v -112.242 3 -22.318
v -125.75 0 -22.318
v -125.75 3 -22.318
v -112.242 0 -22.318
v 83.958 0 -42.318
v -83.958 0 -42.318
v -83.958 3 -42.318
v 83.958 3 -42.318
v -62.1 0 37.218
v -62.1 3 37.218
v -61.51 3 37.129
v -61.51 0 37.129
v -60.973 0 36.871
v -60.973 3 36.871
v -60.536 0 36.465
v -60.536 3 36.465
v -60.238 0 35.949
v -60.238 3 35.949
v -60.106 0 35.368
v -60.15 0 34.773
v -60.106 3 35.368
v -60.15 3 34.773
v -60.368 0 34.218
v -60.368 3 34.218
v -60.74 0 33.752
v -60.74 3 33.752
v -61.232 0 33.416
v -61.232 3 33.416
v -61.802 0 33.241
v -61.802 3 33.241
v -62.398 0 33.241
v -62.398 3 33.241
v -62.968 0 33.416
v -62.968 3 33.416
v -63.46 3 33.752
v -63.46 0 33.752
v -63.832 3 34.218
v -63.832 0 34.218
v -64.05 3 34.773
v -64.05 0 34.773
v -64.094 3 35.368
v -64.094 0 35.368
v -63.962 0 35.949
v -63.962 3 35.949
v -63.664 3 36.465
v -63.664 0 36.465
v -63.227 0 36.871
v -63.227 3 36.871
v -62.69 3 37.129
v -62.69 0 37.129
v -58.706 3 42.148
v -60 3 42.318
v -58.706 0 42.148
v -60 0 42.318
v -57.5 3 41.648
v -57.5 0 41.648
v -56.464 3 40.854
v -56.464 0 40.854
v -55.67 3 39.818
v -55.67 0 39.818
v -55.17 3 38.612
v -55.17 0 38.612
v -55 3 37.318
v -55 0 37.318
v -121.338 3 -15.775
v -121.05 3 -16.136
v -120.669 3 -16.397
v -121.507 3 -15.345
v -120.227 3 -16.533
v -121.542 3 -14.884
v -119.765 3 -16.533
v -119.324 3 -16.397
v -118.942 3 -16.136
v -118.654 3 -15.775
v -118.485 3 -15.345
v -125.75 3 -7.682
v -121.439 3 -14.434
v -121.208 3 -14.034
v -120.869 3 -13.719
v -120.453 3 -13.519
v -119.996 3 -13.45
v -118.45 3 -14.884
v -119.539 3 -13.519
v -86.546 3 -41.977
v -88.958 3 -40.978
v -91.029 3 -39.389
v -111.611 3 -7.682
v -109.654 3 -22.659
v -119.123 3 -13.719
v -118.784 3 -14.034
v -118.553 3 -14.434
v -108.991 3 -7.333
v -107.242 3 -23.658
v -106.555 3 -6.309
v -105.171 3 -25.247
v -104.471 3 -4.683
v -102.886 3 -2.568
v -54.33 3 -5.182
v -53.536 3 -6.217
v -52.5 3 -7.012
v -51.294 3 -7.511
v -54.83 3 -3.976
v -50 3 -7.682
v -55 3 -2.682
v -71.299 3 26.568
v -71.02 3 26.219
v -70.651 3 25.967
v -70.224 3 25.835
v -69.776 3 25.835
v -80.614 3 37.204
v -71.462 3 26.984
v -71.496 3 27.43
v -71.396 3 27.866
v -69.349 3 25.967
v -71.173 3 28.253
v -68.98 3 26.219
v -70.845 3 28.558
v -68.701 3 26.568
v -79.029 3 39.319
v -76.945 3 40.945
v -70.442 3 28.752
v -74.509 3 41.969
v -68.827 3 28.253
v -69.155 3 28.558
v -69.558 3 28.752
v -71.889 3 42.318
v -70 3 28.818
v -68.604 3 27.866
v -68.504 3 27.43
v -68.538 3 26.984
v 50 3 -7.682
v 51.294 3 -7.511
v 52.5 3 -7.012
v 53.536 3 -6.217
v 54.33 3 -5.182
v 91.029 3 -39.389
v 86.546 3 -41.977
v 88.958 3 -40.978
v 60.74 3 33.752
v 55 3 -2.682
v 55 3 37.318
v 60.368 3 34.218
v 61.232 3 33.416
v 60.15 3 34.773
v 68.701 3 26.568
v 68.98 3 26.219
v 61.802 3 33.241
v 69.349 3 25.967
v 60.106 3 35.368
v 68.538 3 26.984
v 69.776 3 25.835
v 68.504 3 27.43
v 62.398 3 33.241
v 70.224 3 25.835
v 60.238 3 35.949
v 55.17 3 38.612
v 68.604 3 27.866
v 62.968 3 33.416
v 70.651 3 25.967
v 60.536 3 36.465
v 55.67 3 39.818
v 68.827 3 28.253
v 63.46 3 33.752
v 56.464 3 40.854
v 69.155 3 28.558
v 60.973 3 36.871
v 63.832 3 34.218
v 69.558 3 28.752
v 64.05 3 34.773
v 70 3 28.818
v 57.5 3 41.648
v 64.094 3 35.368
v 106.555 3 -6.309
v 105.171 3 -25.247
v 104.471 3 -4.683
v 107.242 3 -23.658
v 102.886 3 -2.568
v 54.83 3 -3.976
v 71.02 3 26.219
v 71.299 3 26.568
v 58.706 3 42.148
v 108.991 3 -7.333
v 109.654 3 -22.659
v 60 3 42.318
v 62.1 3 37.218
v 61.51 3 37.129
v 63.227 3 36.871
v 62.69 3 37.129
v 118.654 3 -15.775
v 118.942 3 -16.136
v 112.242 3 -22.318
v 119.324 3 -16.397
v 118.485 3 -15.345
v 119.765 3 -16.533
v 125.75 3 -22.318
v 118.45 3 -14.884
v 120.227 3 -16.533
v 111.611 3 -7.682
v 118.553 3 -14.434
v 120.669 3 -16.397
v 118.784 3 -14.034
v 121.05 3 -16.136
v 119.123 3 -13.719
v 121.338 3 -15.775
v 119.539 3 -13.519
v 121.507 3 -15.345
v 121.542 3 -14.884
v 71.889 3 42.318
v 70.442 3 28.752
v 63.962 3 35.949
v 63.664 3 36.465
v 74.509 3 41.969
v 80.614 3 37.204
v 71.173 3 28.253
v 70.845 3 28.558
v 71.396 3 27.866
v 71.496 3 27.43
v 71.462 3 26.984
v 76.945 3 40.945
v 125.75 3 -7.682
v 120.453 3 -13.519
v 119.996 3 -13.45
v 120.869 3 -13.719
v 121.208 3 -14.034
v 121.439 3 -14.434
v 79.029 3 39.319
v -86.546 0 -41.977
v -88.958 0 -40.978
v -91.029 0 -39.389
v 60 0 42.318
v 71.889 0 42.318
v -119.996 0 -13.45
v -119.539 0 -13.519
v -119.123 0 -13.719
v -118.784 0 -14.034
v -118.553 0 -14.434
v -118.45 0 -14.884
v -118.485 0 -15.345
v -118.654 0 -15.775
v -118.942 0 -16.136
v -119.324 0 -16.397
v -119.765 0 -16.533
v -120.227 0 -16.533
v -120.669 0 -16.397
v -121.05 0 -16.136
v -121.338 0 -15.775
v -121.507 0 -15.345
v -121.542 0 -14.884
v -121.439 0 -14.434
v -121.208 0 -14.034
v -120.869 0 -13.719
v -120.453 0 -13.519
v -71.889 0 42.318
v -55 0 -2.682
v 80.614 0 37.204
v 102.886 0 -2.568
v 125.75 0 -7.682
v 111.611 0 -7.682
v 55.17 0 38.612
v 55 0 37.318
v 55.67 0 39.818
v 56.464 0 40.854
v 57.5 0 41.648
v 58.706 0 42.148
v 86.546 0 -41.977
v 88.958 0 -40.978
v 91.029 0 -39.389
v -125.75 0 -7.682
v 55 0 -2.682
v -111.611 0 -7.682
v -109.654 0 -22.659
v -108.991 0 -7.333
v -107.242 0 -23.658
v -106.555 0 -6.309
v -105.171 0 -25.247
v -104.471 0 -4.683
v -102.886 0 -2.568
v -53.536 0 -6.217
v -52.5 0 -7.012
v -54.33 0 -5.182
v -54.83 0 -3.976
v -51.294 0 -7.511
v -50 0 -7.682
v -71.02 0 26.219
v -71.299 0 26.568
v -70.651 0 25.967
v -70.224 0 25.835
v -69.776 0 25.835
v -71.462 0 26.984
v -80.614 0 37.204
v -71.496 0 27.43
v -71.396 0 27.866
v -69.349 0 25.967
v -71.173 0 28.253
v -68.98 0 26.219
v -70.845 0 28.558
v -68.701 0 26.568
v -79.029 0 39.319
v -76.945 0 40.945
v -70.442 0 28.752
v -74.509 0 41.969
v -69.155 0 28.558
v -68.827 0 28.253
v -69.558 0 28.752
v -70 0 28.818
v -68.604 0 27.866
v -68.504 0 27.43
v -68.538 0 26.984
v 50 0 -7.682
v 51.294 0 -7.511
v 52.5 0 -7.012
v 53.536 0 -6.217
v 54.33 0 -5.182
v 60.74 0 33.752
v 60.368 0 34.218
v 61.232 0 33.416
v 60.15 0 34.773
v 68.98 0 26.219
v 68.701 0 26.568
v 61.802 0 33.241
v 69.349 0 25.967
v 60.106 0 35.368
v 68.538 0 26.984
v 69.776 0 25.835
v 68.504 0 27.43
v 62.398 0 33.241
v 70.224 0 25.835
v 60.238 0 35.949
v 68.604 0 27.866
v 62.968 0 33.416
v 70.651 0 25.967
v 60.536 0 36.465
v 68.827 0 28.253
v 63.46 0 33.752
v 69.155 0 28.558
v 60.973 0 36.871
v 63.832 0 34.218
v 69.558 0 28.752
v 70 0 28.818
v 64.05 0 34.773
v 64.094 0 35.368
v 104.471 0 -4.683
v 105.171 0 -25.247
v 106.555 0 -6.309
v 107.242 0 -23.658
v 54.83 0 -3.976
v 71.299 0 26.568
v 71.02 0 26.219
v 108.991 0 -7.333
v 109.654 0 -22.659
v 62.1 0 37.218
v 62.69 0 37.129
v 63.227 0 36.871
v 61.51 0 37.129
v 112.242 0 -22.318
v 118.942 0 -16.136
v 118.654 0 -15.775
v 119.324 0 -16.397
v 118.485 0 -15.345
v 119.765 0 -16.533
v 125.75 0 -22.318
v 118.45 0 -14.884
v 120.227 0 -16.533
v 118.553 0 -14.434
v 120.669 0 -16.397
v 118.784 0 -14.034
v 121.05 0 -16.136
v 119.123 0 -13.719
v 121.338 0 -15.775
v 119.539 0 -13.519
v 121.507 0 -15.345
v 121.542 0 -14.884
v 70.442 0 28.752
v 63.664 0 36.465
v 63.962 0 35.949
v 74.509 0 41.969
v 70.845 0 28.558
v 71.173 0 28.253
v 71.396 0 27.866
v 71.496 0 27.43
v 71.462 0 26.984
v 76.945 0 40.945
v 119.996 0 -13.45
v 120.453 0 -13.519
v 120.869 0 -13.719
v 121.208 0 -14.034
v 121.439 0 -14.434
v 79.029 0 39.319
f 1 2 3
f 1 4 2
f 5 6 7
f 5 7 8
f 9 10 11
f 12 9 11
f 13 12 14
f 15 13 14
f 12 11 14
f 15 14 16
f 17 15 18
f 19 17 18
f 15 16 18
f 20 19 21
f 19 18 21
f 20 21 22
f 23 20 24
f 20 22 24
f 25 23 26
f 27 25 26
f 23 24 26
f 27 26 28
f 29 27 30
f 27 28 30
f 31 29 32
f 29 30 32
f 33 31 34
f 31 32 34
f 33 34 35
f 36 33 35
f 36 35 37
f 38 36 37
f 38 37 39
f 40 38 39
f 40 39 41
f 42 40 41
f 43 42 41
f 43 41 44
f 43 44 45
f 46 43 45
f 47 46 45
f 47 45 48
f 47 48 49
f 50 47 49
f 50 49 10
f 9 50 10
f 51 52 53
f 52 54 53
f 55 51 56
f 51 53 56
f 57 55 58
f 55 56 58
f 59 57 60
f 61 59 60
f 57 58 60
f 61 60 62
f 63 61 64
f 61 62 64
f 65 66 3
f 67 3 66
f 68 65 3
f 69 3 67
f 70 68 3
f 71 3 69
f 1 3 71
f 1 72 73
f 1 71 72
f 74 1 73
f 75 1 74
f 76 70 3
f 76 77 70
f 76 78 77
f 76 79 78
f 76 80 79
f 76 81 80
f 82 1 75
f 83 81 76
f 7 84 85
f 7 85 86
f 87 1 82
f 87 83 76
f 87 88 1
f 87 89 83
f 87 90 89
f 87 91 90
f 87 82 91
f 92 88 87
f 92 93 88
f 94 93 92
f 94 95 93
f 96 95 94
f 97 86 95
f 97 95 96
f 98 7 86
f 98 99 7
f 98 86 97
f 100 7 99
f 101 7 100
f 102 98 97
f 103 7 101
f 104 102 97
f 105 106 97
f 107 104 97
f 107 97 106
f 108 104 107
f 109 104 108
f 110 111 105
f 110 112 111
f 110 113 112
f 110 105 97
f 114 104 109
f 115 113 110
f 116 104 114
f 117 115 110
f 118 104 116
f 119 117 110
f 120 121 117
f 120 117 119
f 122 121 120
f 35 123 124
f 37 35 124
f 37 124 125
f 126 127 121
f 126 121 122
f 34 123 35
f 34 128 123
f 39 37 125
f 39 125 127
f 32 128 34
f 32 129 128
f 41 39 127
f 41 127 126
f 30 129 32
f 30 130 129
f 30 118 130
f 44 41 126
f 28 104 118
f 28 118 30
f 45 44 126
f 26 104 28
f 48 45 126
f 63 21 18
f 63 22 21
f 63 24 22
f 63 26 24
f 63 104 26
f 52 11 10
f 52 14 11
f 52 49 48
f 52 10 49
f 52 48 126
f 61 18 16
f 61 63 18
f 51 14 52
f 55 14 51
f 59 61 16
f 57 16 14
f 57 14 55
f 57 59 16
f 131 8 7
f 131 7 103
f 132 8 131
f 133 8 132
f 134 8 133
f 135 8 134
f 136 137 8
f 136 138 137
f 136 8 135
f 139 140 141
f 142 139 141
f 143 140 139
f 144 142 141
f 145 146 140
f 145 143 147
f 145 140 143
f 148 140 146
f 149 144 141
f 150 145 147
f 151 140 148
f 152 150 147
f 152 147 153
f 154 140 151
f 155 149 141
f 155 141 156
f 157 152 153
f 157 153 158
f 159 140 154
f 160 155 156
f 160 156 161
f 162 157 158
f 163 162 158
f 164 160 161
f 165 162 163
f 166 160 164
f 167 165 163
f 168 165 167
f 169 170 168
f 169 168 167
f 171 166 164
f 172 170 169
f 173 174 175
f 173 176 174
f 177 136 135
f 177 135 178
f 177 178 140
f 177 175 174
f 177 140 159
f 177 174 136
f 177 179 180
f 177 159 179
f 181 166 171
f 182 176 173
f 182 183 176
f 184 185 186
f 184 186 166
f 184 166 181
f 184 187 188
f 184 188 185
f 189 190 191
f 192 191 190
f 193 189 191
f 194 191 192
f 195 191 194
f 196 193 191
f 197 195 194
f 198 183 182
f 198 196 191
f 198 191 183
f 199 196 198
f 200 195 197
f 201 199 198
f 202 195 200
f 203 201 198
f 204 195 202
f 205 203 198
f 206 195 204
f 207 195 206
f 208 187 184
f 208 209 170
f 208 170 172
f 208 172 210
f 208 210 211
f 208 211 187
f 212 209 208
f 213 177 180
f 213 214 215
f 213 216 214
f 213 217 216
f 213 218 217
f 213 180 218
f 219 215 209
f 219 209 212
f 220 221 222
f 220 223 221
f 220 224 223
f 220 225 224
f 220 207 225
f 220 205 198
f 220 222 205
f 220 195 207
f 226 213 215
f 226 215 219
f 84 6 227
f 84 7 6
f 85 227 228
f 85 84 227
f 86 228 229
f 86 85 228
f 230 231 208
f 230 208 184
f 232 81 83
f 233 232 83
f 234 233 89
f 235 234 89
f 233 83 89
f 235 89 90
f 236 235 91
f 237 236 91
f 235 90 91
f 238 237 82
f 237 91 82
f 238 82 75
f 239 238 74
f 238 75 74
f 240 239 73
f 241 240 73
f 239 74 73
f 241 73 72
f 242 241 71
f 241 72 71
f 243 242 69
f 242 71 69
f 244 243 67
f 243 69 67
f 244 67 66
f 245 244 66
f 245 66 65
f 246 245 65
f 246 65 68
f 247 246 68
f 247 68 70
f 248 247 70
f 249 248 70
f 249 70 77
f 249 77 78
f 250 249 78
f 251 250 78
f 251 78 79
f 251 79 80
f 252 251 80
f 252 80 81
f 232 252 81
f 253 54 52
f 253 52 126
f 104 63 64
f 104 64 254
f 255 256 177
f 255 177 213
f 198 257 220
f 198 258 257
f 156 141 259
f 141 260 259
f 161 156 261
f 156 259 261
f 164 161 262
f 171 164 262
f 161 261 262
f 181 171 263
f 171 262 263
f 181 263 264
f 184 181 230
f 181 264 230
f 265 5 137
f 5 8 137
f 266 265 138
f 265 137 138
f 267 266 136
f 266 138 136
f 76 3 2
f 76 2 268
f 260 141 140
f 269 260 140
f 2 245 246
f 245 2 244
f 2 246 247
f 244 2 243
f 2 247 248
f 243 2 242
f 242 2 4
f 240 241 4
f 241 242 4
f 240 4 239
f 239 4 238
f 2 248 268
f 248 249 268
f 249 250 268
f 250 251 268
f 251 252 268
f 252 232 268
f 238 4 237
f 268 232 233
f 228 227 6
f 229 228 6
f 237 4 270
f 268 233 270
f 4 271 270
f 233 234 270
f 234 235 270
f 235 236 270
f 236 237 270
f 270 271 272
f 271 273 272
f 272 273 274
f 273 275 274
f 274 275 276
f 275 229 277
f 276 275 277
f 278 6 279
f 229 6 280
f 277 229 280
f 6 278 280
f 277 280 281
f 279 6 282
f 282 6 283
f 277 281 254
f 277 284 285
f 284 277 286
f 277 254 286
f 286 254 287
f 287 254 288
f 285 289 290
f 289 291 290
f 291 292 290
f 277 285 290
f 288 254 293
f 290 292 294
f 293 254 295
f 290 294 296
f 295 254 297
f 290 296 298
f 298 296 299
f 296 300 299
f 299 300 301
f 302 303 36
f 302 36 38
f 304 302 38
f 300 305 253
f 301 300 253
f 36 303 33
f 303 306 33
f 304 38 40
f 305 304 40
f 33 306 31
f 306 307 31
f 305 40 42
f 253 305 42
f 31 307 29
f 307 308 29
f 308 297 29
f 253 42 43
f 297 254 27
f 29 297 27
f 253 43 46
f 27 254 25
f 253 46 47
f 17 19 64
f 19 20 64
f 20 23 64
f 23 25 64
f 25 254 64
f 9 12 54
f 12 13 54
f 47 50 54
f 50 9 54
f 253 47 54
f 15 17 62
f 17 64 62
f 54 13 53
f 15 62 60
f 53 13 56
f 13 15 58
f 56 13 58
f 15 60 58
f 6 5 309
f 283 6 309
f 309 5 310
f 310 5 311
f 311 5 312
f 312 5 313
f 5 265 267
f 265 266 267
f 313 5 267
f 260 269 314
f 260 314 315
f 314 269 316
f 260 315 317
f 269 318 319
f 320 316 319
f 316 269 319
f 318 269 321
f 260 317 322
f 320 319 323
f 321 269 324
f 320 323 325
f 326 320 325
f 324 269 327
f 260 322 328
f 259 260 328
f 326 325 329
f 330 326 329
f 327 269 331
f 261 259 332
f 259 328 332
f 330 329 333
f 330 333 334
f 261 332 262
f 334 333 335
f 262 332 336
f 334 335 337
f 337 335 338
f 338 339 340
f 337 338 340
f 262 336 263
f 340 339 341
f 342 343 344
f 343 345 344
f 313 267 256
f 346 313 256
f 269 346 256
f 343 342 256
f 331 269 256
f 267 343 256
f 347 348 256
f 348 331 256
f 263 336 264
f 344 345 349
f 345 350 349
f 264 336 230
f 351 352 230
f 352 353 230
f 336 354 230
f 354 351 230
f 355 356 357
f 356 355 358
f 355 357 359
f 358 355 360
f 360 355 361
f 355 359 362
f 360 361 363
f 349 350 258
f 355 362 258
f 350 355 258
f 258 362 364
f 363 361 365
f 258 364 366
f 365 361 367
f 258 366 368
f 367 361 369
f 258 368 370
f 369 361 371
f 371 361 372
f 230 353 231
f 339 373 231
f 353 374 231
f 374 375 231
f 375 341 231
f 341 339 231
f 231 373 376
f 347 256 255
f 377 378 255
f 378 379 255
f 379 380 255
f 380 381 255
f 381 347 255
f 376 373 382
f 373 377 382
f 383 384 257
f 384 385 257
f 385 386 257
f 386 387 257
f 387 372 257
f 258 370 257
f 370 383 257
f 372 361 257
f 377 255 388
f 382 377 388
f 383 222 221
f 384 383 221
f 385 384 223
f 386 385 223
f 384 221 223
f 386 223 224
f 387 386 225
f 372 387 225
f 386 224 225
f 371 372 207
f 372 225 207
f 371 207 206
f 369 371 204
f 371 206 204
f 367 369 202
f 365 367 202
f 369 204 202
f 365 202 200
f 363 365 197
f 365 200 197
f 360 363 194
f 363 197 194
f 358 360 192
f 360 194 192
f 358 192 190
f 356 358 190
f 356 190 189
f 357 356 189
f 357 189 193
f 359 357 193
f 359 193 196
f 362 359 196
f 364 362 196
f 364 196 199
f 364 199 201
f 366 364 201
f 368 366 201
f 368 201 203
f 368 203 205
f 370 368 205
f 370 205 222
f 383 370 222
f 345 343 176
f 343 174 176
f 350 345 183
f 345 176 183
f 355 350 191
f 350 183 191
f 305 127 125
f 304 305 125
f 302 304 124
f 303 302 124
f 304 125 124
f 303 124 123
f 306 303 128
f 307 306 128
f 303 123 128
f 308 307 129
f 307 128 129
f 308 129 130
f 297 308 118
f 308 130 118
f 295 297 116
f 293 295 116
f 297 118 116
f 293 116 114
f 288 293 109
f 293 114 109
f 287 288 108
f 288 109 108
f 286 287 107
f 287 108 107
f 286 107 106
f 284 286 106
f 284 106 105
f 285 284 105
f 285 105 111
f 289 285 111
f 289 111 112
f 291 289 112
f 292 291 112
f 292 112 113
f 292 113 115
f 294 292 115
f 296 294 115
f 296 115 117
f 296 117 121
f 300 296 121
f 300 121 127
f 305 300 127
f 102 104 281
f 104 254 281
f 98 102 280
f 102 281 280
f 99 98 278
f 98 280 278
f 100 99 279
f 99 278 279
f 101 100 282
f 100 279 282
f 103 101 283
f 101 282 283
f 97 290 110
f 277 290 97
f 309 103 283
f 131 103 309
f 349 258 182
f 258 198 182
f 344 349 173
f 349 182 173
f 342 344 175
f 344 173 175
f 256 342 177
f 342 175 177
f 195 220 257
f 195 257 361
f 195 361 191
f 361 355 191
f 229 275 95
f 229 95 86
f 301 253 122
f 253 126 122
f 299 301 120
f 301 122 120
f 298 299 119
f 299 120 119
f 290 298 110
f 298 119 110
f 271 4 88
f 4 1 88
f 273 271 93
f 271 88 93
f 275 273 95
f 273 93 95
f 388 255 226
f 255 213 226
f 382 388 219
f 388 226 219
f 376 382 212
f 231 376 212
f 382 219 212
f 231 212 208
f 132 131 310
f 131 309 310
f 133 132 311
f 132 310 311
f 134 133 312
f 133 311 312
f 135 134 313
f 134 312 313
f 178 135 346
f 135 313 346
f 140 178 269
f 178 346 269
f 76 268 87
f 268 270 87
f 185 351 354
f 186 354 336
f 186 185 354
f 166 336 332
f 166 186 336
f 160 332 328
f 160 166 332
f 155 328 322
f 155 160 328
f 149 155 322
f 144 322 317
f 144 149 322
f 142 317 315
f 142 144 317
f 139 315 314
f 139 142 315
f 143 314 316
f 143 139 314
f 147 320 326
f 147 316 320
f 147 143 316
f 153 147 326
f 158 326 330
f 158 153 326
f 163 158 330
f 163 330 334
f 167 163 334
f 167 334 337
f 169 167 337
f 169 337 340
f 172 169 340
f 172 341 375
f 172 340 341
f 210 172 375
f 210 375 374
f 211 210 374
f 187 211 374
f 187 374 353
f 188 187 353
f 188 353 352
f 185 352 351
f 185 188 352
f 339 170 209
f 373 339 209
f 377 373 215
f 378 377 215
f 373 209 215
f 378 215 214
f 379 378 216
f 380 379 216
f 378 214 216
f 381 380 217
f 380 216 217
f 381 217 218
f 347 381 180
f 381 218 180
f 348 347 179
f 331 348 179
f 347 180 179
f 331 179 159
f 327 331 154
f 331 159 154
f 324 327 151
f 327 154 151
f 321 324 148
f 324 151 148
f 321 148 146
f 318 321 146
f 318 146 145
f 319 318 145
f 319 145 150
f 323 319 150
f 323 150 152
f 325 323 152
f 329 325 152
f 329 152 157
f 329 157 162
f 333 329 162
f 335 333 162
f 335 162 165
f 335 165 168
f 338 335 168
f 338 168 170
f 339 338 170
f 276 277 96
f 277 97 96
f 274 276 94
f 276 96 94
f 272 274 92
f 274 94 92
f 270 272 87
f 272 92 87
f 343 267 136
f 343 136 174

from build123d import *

# Parameters (mm, degrees)
SALIENTE_EXTRUIR1_DEPTH = 3
REDONDEO1_R             = 10
CROQUIS2_R              = 1.5
CROQUIS2_R_2            = 1.55
CORTAR_EXTRUIR1_DEPTH   = 135.610141171
CROQUIS4_W              = 110
CROQUIS4_H              = 50
CORTAR_EXTRUIR2_DEPTH   = 135.610141171
REDONDEO2_R             = 5
CROQUIS5_W              = 4
CROQUIS5_H              = 14.636342218
CORTAR_EXTRUIR3_DEPTH   = 135.610141171
CROQUIS6_W              = 14.636342218
CROQUIS6_H              = 3
SALIENTE_EXTRUIR2_DEPTH = 2
CROQUIS8_W              = 14.636342218
CROQUIS8_H              = 3
SALIENTE_EXTRUIR3_DEPTH = 2
CROQUIS9_R              = 2
CORTAR_EXTRUIR4_DEPTH   = 133.713564137


with BuildPart() as part:
    # Croquis1 → Saliente-Extruir1 (new body)
    with BuildSketch(Plane(origin=(0, 0, 0), x_dir=(1, 0, 0), z_dir=(0, 1, 0))):
        Polygon((-88.1, 42.318171109), (88.1, 42.318171109), (108.1, 22.318171109), (127.75, 22.318171109), (127.75, 7.681828891), (105.75, 7.681828891), (77.75, -42.318171109), (-77.75, -42.318171109), (-105.75, 7.681828891), (-127.75, 7.681828891), (-127.75, 22.318171109), (-108.1, 22.318171109), align=None)
    extrude(amount=SALIENTE_EXTRUIR1_DEPTH)

    # Redondeo1
    redondeo1_edges = [part.edges().sort_by_distance(p)[0] for p in [
        (-88.1, 1.5, -42.318171109),
        (88.1, 1.5, -42.318171109),
        (108.1, 1.5, -22.318171109),
        (105.75, 1.5, -7.681828891),
        (77.75, 1.5, 42.318171109),
        (-77.75, 1.5, 42.318171109),
        (-105.75, 1.5, -7.681828891),
        (-108.1, 1.5, -22.318171109),
    ]]
    fillet(redondeo1_edges, radius=REDONDEO1_R)

    # Croquis2 → Cortar-Extruir1 (cut, through all)
    with BuildSketch(Plane(origin=(0, 3, 0), x_dir=(1, 0, 0), z_dir=(0, 1, 0))):
        with Locations(Location((70, -27.318171109, 0), (0, 0, 270))):
            Circle(CROQUIS2_R)
        with Locations(Location((-70, -27.318171109, 0), (0, 0, 270))):
            Circle(CROQUIS2_R)
        with Locations(Location((-119.996067812, 15, 0), (0, 0, 270))):
            Circle(CROQUIS2_R_2)
        with Locations(Location((119.996067812, 15, 0), (0, 0, 270))):
            Circle(CROQUIS2_R_2)
        with Locations(Location((-17.5, -17.318171109, 0), (0, 0, 270))):
            Circle(CROQUIS2_R)
        with Locations(Location((17.5, -17.318171109, 0), (0, 0, 270))):
            Circle(CROQUIS2_R)
        with Locations(Location((-17.5, -37.318171109, 0), (0, 0, 270))):
            Circle(CROQUIS2_R)
        with Locations(Location((17.5, -37.318171109, 0), (0, 0, 270))):
            Circle(CROQUIS2_R)
    extrude(amount=-CORTAR_EXTRUIR1_DEPTH, mode=Mode.SUBTRACT)

    # Croquis4 → Cortar-Extruir2 (cut, through all)
    with BuildSketch(Plane(origin=(0, 3, 0), x_dir=(1, 0, 0), z_dir=(0, 1, 0))):
        with Locations((0, -17.318171109)):
            Rectangle(CROQUIS4_W, CROQUIS4_H)
    extrude(amount=-CORTAR_EXTRUIR2_DEPTH, mode=Mode.SUBTRACT)

    # Redondeo2
    redondeo2_edges = [part.edges().sort_by_distance(p)[0] for p in [
        (55, 1.5, 42.318171109),
        (-55, 1.5, 42.318171109),
        (-55, 1.5, -7.681828891),
        (55, 1.5, -7.681828891),
    ]]
    fillet(redondeo2_edges, radius=REDONDEO2_R)

    # Croquis5 → Cortar-Extruir3 (cut, through all)
    with BuildSketch(Plane(origin=(0, 3, 0), x_dir=(1, 0, 0), z_dir=(0, 1, 0))):
        with Locations((-125.75, 15)):
            Rectangle(CROQUIS5_W, CROQUIS5_H)
        with Locations((125.75, 15)):
            Rectangle(CROQUIS5_W, CROQUIS5_H)
    extrude(amount=-CORTAR_EXTRUIR3_DEPTH, mode=Mode.SUBTRACT)

    # Croquis6 → Saliente-Extruir2 (add)
    with BuildSketch(Plane(origin=(123.75, 0, 0), x_dir=(0, 0, -1), z_dir=(1, 0, 0))):
        with Locations((15, 1.5)):
            Rectangle(CROQUIS6_W, CROQUIS6_H)
    extrude(amount=SALIENTE_EXTRUIR2_DEPTH)

    # Croquis8 → Saliente-Extruir3 (add)
    with BuildSketch(Plane.ZY.offset(123.75)):
        with Locations((-15, 1.5)):
            Rectangle(CROQUIS8_W, CROQUIS8_H)
    extrude(amount=SALIENTE_EXTRUIR3_DEPTH)

    # Croquis9 → Cortar-Extruir4 (cut, through all)
    with BuildSketch(Plane(origin=(0, 3, 0), x_dir=(1, 0, 0), z_dir=(0, 1, 0))):
        with Locations(Location((-62.1, -35.218171109, 0), (0, 0, 270))):
            Circle(CROQUIS9_R)
    cortar_extruir4 = extrude(amount=-CORTAR_EXTRUIR4_DEPTH, mode=Mode.SUBTRACT)

    # Simetría1: Cortar-Extruir4 across plane
    add(cortar_extruir4.mirror(Plane(origin=(0, 0, 0), x_dir=(0, 0, 1), z_dir=(1, 0, 0))), mode=Mode.SUBTRACT)


solid = part.part
